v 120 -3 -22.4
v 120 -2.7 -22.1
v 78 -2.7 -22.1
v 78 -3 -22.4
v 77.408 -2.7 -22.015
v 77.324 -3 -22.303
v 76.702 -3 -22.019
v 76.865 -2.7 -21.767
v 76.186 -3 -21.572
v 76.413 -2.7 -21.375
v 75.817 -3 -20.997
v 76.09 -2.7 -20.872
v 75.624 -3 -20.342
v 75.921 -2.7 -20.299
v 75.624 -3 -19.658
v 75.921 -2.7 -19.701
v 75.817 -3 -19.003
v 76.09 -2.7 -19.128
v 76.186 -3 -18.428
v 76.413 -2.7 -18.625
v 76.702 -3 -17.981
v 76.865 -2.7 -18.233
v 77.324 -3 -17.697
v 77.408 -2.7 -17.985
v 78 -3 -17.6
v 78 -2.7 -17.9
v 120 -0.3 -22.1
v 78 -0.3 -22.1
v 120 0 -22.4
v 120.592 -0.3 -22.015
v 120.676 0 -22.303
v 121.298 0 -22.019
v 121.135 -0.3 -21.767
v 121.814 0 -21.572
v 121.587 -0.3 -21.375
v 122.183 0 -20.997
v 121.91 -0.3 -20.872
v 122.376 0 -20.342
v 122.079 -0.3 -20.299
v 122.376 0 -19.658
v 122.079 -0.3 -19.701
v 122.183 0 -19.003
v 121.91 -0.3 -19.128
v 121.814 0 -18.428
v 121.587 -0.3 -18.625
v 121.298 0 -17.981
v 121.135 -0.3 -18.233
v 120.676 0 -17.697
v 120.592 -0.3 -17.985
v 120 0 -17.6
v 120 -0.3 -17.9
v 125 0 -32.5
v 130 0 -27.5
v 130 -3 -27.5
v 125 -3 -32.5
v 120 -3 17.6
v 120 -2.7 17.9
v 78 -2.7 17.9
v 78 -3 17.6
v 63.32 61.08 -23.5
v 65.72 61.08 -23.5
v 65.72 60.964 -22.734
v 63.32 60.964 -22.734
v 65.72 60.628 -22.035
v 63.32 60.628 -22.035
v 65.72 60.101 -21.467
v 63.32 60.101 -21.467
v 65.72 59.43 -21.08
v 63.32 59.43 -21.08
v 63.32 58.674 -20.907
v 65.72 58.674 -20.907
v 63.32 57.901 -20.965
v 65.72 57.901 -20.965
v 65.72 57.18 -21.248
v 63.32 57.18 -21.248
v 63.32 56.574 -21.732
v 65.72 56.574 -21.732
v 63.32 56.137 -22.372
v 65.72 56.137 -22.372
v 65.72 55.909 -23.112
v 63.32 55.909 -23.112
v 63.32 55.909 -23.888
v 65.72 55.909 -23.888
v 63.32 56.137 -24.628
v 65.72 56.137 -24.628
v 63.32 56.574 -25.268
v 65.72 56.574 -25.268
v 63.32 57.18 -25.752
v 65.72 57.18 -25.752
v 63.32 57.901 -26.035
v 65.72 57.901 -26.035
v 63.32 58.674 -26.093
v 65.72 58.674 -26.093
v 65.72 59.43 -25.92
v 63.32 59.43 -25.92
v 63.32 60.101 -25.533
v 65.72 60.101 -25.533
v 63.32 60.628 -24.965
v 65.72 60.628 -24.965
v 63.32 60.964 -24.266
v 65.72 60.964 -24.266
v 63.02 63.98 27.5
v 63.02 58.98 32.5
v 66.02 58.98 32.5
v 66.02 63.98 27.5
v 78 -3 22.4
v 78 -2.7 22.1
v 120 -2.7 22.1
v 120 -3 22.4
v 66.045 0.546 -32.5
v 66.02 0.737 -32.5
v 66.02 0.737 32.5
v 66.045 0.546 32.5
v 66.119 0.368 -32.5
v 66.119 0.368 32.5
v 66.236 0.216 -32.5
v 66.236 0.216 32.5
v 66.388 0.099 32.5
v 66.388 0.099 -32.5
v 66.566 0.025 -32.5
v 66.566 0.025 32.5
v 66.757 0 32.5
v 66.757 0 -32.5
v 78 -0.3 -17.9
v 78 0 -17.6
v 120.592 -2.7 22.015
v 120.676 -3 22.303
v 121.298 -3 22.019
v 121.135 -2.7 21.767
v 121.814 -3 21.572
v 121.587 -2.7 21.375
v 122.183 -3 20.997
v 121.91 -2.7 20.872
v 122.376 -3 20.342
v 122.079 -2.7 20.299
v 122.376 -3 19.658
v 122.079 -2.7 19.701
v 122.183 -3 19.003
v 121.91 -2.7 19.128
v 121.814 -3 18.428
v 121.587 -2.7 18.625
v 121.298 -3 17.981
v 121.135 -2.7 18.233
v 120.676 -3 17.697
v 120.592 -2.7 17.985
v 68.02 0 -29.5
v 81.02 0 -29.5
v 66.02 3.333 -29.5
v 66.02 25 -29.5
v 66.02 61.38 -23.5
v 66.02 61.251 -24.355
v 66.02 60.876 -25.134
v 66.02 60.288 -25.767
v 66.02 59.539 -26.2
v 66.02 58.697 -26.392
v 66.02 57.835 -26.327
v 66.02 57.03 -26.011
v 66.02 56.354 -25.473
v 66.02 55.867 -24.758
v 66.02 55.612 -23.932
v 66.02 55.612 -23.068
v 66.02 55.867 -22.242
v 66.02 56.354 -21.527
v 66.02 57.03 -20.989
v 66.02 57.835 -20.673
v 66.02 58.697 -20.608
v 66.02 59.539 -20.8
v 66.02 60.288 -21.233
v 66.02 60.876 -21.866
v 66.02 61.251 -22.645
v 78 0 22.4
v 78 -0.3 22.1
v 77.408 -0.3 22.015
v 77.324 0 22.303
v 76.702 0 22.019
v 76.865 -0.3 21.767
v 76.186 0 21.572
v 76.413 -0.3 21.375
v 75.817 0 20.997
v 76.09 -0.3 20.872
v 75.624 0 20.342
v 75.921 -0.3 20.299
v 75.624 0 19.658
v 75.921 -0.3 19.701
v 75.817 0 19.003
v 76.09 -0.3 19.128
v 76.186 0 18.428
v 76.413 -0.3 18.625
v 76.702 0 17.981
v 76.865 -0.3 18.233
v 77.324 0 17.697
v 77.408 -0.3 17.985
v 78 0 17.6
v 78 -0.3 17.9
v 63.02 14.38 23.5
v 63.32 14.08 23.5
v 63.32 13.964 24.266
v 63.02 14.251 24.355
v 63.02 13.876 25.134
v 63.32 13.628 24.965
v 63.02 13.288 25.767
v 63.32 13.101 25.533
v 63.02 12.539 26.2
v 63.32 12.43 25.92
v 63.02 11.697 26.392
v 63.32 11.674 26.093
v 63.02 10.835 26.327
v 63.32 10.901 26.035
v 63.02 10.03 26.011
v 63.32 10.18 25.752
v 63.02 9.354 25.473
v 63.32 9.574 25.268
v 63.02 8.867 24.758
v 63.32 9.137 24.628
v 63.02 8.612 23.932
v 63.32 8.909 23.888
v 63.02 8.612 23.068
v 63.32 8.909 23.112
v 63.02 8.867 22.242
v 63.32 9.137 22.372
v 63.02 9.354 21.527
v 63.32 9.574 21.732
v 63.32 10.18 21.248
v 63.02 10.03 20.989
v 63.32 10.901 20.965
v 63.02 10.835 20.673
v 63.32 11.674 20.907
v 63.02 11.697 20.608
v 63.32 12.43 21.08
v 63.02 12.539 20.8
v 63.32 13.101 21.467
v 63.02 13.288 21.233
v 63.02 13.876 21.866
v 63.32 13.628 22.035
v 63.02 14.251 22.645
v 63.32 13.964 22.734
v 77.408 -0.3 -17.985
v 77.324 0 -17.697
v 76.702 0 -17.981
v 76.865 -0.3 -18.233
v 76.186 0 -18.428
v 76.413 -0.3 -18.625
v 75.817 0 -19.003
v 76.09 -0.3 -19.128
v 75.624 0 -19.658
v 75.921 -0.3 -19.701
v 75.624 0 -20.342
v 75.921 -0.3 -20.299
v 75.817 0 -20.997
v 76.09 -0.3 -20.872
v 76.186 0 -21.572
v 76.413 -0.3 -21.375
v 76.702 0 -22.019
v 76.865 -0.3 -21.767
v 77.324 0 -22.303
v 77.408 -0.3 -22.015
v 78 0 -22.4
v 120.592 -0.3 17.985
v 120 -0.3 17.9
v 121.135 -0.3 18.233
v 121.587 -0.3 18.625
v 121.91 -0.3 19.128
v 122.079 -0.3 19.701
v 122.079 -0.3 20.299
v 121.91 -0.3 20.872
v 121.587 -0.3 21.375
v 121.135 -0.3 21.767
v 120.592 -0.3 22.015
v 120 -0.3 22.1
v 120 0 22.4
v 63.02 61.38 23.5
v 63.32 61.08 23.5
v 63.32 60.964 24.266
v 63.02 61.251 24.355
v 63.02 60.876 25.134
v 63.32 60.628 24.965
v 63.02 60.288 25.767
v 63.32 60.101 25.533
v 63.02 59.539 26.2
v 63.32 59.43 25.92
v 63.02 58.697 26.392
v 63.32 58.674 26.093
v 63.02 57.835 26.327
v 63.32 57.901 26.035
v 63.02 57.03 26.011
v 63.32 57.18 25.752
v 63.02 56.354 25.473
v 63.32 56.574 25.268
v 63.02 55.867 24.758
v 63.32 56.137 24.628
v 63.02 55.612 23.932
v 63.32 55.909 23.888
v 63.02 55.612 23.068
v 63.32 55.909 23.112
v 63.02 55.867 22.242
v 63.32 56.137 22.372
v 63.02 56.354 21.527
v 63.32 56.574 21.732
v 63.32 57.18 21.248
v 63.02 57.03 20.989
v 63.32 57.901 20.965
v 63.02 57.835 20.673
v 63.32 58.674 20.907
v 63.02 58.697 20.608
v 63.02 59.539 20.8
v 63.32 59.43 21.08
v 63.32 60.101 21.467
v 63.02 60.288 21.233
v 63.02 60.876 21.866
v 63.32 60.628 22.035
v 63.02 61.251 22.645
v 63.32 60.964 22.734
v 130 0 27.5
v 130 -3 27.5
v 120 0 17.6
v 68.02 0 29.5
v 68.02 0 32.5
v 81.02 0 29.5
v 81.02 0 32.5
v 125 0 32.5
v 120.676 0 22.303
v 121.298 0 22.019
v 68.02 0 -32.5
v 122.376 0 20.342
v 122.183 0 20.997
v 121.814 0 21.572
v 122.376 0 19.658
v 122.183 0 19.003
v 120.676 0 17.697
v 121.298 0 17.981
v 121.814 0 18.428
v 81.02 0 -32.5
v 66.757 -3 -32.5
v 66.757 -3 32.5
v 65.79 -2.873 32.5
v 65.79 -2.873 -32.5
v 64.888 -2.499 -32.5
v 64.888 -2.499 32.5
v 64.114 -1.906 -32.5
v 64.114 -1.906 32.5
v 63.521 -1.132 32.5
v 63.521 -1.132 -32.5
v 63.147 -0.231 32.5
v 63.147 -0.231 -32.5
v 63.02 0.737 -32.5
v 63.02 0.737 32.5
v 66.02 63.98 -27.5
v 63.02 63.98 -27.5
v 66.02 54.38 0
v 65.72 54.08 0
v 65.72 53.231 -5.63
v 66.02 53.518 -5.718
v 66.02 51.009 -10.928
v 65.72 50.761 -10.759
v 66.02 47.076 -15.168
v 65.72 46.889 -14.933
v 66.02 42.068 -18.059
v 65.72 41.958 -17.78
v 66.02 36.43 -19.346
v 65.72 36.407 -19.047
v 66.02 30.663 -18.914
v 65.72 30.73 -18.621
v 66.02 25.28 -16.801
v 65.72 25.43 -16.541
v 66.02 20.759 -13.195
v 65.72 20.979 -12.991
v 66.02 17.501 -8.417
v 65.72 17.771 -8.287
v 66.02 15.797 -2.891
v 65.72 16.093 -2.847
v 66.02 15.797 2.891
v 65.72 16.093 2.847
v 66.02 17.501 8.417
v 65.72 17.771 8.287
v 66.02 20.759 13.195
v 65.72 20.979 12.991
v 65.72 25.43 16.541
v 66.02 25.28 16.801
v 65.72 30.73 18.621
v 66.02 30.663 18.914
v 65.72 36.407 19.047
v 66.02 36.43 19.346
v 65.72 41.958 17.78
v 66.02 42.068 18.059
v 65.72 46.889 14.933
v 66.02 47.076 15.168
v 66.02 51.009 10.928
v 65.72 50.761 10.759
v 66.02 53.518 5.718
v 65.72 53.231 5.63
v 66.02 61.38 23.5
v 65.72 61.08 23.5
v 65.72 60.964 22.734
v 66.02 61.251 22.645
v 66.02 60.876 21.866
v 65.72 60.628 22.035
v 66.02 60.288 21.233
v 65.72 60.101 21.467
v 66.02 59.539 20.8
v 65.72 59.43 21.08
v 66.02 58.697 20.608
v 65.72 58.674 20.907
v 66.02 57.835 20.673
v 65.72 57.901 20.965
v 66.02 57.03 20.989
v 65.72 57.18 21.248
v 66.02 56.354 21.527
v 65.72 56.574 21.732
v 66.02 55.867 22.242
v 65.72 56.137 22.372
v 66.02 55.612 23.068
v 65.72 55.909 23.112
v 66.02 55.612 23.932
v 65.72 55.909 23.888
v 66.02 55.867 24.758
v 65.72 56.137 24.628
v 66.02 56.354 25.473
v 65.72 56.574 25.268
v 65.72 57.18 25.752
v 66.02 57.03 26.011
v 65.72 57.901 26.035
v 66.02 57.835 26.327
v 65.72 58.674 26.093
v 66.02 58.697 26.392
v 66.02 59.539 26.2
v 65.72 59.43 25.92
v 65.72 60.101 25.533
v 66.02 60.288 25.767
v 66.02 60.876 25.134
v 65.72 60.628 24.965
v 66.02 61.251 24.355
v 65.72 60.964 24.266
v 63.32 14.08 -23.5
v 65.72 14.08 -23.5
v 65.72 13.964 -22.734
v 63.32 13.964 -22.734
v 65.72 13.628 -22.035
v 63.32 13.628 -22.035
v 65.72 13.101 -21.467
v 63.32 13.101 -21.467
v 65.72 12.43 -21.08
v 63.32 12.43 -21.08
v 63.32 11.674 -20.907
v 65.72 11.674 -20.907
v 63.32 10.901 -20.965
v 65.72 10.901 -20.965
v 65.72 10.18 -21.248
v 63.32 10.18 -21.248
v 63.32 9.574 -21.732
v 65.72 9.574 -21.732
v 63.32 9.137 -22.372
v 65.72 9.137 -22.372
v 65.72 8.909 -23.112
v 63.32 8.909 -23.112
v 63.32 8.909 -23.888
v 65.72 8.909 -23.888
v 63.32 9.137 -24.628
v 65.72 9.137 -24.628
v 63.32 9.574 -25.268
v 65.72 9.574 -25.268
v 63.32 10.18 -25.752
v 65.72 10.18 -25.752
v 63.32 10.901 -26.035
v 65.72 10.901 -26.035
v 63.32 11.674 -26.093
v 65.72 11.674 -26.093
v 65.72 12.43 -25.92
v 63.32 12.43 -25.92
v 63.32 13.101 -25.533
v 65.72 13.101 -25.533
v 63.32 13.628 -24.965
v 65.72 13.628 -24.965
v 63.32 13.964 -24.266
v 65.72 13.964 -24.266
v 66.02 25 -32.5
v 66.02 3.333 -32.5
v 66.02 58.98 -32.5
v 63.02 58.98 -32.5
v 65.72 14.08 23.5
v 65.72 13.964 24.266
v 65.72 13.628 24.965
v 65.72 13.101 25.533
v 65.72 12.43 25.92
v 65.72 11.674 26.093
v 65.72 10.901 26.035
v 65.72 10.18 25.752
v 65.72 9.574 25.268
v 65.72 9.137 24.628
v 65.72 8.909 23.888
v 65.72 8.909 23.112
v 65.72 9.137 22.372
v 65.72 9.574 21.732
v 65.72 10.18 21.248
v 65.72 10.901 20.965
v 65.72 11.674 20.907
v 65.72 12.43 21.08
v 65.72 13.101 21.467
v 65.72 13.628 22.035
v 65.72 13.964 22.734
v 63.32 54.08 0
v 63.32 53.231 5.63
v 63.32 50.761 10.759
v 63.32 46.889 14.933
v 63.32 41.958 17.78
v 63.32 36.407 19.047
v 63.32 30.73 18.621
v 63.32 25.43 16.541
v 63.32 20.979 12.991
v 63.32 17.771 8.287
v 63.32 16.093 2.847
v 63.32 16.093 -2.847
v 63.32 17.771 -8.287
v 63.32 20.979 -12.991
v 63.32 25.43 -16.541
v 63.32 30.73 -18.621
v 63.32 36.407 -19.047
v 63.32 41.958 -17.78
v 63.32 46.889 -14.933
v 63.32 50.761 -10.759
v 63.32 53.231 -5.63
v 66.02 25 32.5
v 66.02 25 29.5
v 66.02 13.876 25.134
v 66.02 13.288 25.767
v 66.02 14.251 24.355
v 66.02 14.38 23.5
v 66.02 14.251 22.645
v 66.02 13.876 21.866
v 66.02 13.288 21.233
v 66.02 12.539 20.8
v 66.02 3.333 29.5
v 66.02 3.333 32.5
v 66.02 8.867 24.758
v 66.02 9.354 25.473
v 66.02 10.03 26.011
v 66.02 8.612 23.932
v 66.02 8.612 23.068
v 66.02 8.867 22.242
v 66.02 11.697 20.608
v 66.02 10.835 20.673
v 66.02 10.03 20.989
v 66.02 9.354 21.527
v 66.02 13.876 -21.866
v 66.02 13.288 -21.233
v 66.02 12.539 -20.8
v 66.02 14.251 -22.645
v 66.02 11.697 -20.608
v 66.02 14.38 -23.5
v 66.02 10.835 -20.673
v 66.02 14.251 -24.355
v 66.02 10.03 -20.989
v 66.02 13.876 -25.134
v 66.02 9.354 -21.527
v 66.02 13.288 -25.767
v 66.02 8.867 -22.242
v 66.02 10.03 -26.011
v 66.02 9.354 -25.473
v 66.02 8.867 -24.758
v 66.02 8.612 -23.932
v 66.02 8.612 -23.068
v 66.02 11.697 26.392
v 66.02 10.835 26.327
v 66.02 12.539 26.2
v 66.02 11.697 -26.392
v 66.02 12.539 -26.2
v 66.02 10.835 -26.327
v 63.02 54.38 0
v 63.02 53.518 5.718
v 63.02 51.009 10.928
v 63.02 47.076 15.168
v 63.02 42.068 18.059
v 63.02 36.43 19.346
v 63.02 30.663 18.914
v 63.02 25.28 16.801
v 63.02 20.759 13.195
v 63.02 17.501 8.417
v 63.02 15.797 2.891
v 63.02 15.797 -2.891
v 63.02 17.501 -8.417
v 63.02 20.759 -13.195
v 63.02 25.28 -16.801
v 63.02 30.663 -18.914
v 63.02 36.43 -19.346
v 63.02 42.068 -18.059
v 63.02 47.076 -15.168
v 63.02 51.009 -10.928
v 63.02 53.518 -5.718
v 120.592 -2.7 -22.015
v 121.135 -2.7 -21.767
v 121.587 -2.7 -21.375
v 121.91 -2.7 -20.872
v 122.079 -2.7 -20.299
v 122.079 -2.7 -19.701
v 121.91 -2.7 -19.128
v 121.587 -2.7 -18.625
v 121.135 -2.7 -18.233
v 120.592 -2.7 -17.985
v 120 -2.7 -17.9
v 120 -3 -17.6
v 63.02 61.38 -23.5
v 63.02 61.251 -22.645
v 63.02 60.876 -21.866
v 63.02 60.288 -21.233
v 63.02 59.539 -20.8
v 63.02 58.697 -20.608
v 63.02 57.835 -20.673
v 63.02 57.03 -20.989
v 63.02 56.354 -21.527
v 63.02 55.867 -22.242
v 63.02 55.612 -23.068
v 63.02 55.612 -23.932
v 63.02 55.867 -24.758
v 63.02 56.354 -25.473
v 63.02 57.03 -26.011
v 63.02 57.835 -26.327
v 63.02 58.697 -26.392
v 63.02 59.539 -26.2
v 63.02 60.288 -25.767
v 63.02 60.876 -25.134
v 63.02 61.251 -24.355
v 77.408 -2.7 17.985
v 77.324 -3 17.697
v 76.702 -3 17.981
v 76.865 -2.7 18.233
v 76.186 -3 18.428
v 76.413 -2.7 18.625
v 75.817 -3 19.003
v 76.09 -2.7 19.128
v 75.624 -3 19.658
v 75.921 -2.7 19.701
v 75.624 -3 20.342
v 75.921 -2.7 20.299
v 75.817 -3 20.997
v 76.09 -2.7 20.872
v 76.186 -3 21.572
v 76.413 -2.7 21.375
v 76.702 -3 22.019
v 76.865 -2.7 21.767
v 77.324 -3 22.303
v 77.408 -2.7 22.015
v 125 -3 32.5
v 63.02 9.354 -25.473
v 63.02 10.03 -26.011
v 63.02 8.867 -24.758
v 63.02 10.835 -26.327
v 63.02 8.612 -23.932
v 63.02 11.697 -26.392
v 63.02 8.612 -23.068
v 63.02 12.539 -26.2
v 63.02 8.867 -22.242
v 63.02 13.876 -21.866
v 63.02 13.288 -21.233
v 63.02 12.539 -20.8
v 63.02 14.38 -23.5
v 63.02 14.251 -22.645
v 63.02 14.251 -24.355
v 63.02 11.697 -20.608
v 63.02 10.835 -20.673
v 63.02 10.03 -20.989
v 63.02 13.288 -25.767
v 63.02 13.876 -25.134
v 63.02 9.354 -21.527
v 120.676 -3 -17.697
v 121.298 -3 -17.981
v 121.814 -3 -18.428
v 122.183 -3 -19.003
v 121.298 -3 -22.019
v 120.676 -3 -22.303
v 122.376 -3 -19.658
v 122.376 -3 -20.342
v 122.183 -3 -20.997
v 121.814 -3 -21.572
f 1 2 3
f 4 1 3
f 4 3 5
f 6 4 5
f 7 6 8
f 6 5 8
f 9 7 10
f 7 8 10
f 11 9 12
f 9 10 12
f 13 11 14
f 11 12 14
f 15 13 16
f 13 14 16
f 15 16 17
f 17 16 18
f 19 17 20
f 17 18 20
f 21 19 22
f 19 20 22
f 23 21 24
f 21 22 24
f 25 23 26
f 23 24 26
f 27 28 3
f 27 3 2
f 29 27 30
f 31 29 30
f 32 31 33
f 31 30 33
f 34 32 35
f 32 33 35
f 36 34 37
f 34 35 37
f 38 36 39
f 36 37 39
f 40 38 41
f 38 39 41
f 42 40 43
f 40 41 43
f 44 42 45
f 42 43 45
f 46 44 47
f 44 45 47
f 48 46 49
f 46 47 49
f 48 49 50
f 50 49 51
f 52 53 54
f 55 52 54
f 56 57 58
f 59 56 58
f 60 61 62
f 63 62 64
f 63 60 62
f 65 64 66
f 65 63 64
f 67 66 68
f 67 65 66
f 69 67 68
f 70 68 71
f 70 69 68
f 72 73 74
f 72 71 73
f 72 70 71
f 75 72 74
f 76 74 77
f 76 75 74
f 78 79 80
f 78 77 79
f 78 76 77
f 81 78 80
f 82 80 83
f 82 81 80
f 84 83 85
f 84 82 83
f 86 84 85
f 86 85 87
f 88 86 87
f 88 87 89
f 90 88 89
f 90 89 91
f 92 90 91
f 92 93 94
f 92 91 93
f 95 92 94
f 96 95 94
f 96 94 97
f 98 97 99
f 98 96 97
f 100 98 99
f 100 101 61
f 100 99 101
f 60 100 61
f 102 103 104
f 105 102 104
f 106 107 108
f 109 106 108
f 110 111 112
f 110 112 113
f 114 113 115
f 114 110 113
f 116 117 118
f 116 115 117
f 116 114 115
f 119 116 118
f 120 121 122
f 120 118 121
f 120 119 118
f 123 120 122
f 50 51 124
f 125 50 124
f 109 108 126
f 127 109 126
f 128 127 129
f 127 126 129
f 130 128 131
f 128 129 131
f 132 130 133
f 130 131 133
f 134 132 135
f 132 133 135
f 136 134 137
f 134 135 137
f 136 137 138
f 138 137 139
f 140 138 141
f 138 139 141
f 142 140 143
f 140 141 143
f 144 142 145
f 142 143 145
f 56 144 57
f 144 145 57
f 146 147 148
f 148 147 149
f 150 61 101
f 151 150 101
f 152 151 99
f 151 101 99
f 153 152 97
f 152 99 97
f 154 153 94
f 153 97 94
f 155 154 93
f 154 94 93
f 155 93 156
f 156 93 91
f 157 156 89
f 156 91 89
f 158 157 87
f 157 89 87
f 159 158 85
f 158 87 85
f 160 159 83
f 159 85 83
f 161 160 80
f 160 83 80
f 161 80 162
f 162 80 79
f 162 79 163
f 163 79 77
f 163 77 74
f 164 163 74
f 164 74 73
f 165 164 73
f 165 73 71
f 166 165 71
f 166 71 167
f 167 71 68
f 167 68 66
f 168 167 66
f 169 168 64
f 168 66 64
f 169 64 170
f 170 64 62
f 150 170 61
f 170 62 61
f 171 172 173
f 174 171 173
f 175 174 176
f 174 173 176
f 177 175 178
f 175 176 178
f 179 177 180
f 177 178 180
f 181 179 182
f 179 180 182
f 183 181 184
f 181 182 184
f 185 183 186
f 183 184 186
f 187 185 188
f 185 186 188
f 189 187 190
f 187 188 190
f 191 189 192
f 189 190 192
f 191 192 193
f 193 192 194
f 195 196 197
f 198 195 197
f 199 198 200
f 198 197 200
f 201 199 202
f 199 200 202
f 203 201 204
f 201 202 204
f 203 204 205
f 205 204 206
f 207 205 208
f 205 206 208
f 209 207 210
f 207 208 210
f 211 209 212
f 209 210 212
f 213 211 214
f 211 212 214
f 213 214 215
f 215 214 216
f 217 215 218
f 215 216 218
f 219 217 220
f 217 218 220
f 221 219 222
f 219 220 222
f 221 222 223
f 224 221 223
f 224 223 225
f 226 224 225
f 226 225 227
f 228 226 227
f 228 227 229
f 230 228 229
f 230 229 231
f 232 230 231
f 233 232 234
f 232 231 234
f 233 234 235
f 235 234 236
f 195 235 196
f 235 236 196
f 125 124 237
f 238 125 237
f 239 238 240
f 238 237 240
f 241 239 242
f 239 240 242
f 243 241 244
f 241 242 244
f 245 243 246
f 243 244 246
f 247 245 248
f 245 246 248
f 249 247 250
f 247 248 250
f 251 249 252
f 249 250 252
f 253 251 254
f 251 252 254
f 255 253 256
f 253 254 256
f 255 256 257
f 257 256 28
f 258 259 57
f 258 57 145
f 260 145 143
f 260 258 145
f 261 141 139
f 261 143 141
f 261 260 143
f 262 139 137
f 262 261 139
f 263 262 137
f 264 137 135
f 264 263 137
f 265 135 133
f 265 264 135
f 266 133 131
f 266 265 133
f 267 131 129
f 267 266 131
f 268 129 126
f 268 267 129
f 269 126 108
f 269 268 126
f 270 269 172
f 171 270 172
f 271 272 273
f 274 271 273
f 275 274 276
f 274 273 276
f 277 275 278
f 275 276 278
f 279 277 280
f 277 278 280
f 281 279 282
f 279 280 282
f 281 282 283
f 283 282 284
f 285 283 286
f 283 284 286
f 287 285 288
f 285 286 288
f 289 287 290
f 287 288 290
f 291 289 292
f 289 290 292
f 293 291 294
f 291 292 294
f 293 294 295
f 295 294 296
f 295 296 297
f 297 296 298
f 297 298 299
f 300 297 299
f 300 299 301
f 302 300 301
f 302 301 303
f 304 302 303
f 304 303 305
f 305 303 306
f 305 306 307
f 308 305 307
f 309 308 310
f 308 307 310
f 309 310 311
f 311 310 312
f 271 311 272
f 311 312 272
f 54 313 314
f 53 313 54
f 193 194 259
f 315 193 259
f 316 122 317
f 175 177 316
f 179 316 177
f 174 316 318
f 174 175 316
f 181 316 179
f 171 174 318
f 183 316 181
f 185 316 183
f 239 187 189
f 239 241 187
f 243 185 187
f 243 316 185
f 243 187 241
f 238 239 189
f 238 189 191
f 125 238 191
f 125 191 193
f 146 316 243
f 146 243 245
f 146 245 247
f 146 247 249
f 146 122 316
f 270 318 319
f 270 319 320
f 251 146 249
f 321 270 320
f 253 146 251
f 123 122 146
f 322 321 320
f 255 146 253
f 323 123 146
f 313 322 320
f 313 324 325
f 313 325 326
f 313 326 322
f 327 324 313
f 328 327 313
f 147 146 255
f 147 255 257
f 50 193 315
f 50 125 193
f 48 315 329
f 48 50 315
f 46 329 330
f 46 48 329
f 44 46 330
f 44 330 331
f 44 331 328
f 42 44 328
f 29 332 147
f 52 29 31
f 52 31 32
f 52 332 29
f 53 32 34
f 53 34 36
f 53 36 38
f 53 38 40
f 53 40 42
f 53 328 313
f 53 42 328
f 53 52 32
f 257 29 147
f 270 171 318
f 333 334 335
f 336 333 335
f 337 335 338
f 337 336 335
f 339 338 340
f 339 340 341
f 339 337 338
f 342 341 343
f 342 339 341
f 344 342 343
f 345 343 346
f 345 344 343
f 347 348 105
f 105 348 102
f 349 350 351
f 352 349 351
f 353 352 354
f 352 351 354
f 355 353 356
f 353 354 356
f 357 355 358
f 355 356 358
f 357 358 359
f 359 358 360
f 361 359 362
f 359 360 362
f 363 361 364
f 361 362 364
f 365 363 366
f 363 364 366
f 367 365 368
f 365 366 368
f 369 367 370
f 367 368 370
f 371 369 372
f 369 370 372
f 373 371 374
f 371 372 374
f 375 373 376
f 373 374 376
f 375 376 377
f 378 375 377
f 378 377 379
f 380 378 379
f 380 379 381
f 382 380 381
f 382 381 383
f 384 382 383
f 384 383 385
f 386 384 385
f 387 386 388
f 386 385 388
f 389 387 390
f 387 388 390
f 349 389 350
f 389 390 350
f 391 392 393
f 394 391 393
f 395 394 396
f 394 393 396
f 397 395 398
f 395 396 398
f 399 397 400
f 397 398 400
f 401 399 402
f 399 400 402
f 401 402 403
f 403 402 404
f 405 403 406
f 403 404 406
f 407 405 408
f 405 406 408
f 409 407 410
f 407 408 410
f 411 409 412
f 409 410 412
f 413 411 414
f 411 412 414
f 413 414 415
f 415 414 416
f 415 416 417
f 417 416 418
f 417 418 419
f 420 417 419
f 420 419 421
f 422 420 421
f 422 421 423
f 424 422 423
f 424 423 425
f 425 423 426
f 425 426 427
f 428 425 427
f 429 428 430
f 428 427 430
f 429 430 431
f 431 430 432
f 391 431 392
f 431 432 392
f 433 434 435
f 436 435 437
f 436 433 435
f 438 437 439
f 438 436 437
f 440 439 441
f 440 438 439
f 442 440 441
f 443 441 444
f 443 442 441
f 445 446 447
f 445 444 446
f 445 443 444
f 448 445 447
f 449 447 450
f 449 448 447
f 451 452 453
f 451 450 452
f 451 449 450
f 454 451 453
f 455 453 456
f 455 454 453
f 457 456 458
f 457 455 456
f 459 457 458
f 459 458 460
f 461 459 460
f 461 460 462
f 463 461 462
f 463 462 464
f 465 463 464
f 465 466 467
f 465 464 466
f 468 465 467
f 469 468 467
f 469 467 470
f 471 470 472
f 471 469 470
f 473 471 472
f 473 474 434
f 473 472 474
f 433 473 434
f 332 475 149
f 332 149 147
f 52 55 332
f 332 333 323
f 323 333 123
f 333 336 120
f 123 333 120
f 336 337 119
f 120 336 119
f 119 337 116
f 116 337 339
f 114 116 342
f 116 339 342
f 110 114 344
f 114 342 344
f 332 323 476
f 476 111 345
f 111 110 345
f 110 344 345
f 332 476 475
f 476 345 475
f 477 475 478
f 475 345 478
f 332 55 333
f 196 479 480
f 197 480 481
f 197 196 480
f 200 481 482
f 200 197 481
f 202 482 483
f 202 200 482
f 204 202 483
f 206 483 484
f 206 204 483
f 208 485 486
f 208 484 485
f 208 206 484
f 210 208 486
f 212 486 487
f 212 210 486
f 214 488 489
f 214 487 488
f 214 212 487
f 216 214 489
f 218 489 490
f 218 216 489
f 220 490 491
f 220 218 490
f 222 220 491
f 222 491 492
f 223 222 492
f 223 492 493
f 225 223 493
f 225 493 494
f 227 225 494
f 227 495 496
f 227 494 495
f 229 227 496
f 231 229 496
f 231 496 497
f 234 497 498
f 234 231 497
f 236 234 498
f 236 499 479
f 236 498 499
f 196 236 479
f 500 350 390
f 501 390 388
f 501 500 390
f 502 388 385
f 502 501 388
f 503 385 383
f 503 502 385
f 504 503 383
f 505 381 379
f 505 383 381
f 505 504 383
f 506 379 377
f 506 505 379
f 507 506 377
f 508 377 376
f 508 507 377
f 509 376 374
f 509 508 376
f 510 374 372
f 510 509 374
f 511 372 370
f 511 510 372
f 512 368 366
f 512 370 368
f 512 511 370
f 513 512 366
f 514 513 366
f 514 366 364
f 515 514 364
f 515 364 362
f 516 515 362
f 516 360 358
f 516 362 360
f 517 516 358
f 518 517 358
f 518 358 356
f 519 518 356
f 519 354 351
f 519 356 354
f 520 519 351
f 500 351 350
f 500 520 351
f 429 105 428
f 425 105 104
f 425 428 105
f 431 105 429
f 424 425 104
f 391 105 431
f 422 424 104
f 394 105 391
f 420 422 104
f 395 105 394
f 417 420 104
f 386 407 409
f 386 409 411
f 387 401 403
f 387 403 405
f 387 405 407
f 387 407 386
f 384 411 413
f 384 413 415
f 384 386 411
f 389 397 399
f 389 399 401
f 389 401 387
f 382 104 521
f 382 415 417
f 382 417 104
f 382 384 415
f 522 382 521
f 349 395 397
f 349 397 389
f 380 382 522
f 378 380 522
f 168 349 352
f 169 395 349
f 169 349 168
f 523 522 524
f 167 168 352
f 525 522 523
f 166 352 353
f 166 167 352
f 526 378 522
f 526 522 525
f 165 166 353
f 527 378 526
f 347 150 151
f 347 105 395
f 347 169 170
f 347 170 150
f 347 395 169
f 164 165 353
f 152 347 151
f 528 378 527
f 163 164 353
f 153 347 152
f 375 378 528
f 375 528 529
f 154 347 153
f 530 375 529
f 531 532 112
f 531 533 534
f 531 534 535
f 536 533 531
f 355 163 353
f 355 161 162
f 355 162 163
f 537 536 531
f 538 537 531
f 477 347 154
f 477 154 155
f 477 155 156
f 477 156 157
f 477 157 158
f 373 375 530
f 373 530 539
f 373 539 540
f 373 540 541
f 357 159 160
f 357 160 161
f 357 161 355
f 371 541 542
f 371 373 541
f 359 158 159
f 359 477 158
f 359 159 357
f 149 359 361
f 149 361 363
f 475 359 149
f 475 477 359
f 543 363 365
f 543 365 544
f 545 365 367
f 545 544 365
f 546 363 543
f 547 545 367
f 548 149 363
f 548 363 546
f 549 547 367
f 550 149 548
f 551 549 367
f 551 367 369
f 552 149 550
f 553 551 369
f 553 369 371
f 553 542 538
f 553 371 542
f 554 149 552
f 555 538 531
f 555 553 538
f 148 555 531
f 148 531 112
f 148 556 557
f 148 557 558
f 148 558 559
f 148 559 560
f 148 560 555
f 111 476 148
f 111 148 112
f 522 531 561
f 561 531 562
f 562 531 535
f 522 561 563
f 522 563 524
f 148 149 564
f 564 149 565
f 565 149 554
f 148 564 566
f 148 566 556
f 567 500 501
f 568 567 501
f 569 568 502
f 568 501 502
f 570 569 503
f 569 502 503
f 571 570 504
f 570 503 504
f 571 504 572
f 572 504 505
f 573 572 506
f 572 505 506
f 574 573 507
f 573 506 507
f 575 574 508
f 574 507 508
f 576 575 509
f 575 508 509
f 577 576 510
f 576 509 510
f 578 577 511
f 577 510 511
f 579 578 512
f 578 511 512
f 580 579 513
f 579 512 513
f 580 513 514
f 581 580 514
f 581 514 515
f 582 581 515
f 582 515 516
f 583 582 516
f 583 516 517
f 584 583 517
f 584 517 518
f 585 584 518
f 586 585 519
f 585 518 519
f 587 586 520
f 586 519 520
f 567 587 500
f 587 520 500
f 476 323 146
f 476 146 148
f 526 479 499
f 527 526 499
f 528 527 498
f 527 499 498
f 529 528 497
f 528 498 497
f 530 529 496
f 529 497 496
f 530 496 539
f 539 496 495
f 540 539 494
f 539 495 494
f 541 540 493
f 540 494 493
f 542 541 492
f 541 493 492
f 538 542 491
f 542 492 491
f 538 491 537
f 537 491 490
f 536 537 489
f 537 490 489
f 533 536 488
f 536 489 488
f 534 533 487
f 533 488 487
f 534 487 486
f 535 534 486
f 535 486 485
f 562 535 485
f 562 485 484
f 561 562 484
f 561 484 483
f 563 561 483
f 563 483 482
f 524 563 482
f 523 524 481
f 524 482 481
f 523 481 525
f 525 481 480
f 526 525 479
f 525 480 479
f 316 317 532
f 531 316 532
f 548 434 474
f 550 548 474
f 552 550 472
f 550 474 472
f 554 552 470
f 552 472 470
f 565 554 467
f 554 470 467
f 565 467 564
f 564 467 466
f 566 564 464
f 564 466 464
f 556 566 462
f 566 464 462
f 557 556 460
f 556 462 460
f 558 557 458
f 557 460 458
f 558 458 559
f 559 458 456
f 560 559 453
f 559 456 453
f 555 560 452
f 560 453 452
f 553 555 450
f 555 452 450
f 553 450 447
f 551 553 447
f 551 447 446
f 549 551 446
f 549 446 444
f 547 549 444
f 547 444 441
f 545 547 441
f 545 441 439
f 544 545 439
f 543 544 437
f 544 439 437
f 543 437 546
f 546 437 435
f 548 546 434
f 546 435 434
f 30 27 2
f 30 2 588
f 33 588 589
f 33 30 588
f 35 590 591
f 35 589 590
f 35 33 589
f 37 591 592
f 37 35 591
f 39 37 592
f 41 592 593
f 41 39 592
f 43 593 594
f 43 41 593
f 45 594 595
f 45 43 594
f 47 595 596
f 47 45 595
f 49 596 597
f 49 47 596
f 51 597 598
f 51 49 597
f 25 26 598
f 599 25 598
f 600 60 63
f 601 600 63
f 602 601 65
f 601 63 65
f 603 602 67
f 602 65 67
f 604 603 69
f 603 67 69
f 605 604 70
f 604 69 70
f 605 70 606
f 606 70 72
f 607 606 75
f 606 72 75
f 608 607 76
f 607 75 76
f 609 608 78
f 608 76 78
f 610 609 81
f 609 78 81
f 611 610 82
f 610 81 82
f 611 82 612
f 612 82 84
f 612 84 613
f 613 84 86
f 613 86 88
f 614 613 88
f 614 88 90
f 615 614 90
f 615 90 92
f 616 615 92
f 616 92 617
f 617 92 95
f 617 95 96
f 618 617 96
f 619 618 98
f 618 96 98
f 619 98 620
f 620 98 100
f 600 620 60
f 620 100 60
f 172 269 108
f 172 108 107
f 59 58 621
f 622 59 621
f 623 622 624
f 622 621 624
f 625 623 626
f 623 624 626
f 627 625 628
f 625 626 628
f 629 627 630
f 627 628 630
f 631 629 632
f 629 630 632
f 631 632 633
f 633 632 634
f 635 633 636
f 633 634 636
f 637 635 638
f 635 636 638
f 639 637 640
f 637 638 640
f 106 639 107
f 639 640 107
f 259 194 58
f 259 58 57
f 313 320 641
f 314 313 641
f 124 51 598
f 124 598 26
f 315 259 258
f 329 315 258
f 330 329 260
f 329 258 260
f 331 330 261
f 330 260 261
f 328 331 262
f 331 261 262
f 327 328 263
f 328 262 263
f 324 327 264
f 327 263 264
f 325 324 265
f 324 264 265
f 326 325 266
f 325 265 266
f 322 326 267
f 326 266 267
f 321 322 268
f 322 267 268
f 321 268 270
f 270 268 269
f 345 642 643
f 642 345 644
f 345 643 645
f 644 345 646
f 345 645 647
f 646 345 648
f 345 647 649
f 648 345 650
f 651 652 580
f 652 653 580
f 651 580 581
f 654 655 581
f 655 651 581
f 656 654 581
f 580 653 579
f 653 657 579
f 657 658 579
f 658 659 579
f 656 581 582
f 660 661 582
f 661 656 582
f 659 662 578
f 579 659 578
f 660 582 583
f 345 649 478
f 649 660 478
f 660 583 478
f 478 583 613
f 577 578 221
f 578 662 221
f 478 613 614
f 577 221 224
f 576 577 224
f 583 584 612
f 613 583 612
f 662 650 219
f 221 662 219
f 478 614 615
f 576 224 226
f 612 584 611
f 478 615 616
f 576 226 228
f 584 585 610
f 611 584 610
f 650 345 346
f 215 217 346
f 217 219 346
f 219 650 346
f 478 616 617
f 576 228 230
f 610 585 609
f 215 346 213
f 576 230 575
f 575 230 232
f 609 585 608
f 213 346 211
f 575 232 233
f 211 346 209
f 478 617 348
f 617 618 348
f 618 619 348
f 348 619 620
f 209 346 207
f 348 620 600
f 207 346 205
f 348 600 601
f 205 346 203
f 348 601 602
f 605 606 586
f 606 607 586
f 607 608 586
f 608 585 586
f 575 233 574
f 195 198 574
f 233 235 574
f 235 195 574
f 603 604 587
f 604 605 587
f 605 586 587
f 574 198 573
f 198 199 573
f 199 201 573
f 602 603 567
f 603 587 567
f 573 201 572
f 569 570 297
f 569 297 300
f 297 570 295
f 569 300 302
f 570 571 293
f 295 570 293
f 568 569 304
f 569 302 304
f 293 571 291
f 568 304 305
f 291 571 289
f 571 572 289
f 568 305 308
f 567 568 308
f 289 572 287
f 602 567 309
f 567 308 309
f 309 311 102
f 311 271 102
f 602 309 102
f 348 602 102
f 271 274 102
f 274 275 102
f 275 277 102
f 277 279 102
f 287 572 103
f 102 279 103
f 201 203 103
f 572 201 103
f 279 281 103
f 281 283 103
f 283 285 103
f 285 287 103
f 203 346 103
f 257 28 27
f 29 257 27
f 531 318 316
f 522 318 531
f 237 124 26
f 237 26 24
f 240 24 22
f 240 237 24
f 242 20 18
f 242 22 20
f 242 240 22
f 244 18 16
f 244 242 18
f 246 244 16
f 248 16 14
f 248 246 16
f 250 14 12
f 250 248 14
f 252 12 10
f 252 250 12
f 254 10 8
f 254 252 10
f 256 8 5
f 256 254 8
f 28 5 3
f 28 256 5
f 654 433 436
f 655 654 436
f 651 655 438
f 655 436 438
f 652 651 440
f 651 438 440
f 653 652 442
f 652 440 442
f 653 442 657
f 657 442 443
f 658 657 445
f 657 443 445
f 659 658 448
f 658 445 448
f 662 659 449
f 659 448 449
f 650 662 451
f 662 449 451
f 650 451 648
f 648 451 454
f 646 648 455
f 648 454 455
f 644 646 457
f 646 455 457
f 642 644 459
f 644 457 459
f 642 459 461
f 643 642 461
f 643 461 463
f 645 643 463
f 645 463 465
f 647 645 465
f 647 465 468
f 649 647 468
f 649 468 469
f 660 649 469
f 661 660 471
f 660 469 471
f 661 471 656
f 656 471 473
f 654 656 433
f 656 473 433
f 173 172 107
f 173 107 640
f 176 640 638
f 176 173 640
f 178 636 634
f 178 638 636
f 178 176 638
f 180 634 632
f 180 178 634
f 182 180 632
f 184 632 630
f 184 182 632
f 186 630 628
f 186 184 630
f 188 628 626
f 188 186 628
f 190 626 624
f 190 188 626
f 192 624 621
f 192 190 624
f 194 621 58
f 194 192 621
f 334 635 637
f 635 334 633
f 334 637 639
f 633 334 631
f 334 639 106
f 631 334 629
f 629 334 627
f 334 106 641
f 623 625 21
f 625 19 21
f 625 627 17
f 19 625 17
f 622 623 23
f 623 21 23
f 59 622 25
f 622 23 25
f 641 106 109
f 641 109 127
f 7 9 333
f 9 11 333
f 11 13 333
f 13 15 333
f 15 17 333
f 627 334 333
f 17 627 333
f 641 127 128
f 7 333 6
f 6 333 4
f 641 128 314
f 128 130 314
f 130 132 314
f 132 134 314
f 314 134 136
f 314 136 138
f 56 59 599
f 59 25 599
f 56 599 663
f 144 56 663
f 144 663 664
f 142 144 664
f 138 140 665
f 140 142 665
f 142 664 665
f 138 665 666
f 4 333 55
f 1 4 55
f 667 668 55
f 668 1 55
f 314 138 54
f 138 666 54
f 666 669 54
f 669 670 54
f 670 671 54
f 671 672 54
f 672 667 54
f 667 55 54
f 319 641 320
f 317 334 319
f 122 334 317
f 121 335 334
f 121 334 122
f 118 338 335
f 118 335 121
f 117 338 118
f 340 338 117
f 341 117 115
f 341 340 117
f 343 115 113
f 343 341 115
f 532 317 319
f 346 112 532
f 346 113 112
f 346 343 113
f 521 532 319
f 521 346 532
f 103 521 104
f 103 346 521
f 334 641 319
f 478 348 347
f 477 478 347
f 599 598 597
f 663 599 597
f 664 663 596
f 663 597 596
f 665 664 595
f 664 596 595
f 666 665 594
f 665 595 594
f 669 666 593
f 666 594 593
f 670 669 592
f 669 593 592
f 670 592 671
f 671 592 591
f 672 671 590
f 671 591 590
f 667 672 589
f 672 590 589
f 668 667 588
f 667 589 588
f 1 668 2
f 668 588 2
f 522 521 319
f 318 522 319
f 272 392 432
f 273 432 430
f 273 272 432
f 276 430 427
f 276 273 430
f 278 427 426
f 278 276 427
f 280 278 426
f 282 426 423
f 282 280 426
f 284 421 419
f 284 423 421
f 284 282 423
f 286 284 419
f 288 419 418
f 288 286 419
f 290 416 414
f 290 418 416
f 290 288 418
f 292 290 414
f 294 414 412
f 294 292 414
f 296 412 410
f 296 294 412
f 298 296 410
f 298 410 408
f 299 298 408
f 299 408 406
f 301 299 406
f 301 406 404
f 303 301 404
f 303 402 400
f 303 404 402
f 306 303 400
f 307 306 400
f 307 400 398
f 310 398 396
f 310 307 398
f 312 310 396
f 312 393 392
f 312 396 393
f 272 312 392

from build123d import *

# Parameters (mm, degrees)
SKETCH1_W                    = 130
SKETCH1_H                    = 65
BASE_FLANGE1_DEPTH           = 3
SKETCH2_R                    = 19.1
SKETCH2_R_2                  = 2.6
CUT_EXTRUDE1_DEPTH           = 135.034510481
CUT_EXTRUDE3_DEPTH           = 135.034510481
SKETCHED_BEND2_OUTLINE_W     = 3
SKETCHED_BEND2_OUTLINE_H     = 65
SKETCHED_BEND2_DEPTH         = 63.020021532
SKETCHED_START               = 63.383443248
SKETCHED_BEND2_2_OUTLINE_W   = 63.979978468
SKETCHED_BEND2_2_OUTLINE_H   = 65
SKETCHED_BEND2_2_OUTLINE_R   = 2.6
SKETCHED_BEND2_2_OUTLINE_R_2 = 19.1
SKETCHED_BEND2_2_DEPTH       = 2.636578284
SKETCHED_START_2             = 63.020021532
SKETCHED_BEND2_3_OUTLINE_W   = 63.979978468
SKETCHED_BEND2_3_OUTLINE_H   = 65
SKETCHED_BEND2_3_OUTLINE_R   = 2.6
SKETCHED_BEND2_3_OUTLINE_R_2 = 19.1
SKETCHED_BEND2_3_DEPTH       = 3.7366
SKETCHED_START_3             = -33
SKETCHED_BEND2_4_DEPTH       = 66
BOSS_EXTRUDE1_DEPTH          = 3
CHAMFER1_SIZE                = 5
CHAMFER2_SIZE                = 0.3


with BuildPart() as part:
    # Base-Flange1: sheet metal written as solids
    # Sketch1 → Base-Flange1 (new body)
    with BuildSketch(Plane(origin=(0, 0, 0), x_dir=(1, 0, 0), z_dir=(0, 1, 0))):
        with Locations((65, 0)):
            Rectangle(SKETCH1_W, SKETCH1_H)
    extrude(amount=-BASE_FLANGE1_DEPTH)

    # Sketch2 → Cut-Extrude1 (cut, through all)
    with BuildSketch(Plane(origin=(0, 0, 0), x_dir=(1, 0, 0), z_dir=(0, 1, 0))):
        with Locations(Location((29, 0, 0), (0, 0, 270))):
            Circle(SKETCH2_R)
        with Locations(Location((5.5, 23.5, 0), (0, 0, 270))):
            Circle(SKETCH2_R_2)
        with Locations(Location((52.5, 23.5, 0), (0, 0, 270))):
            Circle(SKETCH2_R_2)
        with Locations(Location((52.5, -23.5, 0), (0, 0, 270))):
            Circle(SKETCH2_R_2)
        with Locations(Location((5.5, -23.5, 0), (0, 0, 270))):
            Circle(SKETCH2_R_2)
    extrude(amount=-CUT_EXTRUDE1_DEPTH, mode=Mode.SUBTRACT)

    # Sketch4 → Cut-Extrude3 (cut, through all)
    with BuildSketch(Plane(origin=(0, 0, 0), x_dir=(1, 0, 0), z_dir=(0, 1, 0))):
        with BuildLine():
            Line((78, 22.1), (120, 22.1))
            ThreePointArc((120, 22.1), (122.1, 20), (120, 17.9))
            Line((120, 17.9), (78, 17.9))
            ThreePointArc((78, 17.9), (75.9, 20), (78, 22.1))
        make_face()
        with BuildLine():
            Line((78, -17.9), (120, -17.9))
            ThreePointArc((120, -17.9), (122.1, -20), (120, -22.1))
            Line((120, -22.1), (78, -22.1))
            ThreePointArc((78, -22.1), (75.9, -20), (78, -17.9))
        make_face()
    extrude(amount=-CUT_EXTRUDE3_DEPTH, mode=Mode.SUBTRACT)

    # Sketched Bend2: read off the stored shape, not the designer's step
    # Sketched Bend2 outline → Sketched Bend2 (cut)
    with BuildSketch(Plane.YZ):
        with Locations((-1.5, 0)):
            Rectangle(SKETCHED_BEND2_OUTLINE_W, SKETCHED_BEND2_OUTLINE_H)
    extrude(amount=SKETCHED_BEND2_DEPTH, mode=Mode.SUBTRACT)

    # Sketched Bend2 2 outline → Sketched Bend2 2 (add)
    with BuildSketch(Plane.YZ.offset(SKETCHED_START)):
        with Locations((31.989989234, 0)):
            Rectangle(SKETCHED_BEND2_2_OUTLINE_W, SKETCHED_BEND2_2_OUTLINE_H)
        with Locations((11.479978468, -23.5)):
            Circle(SKETCHED_BEND2_2_OUTLINE_R, mode=Mode.SUBTRACT)
        with Locations((58.479978468, -23.5)):
            Circle(SKETCHED_BEND2_2_OUTLINE_R, mode=Mode.SUBTRACT)
        with Locations((11.479978468, 23.5)):
            Circle(SKETCHED_BEND2_2_OUTLINE_R, mode=Mode.SUBTRACT)
        with Locations((34.979978468, 0)):
            Circle(SKETCHED_BEND2_2_OUTLINE_R_2, mode=Mode.SUBTRACT)
        with Locations((58.479978468, 23.5)):
            Circle(SKETCHED_BEND2_2_OUTLINE_R, mode=Mode.SUBTRACT)
    extrude(amount=SKETCHED_BEND2_2_DEPTH)

    # Sketched Bend2 3 outline → Sketched Bend2 3 (add)
    with BuildSketch(Plane.YZ.offset(SKETCHED_START_2)):
        with Locations((31.989989234, 0)):
            Rectangle(SKETCHED_BEND2_3_OUTLINE_W, SKETCHED_BEND2_3_OUTLINE_H)
        with Locations((11.479978468, -23.5)):
            Circle(SKETCHED_BEND2_3_OUTLINE_R, mode=Mode.SUBTRACT)
        with Locations((58.479978468, -23.5)):
            Circle(SKETCHED_BEND2_3_OUTLINE_R, mode=Mode.SUBTRACT)
        with Locations((11.479978468, 23.5)):
            Circle(SKETCHED_BEND2_3_OUTLINE_R, mode=Mode.SUBTRACT)
        with Locations((34.979978468, 0)):
            Circle(SKETCHED_BEND2_3_OUTLINE_R_2, mode=Mode.SUBTRACT)
        with Locations((58.479978468, 23.5)):
            Circle(SKETCHED_BEND2_3_OUTLINE_R, mode=Mode.SUBTRACT)
    extrude(amount=SKETCHED_BEND2_3_DEPTH)

    # Sketched Bend2 4 outline → Sketched Bend2 4 (cut)
    with BuildSketch(Plane.XY.offset(SKETCHED_START_3)):
        with BuildLine():
            Line((66.756621532, 63.979978468), (66.020021532, 63.979978468))
            Line((66.020021532, 63.979978468), (66.020021532, 0.7366))
            ThreePointArc((66.020021532, 0.7366), (66.235766677, 0.215745145), (66.756621532, 0))
            Line((66.756621532, 0), (66.756621532, 63.979978468))
        make_face()
        with BuildLine():
            ThreePointArc((66.756621532, -3), (64.114446333, -1.905575199), (63.020021532, 0.7366))
            Line((63.020021532, 0.7366), (63.020021532, -3))
            Line((63.020021532, -3), (66.756621532, -3))
        make_face()
    extrude(amount=SKETCHED_BEND2_4_DEPTH, mode=Mode.SUBTRACT)

    # Sketch6 → Boss-Extrude1 (add)
    with BuildSketch(Plane.XY.offset(32.5)):
        Polygon((66.020021532, 25), (81.020021532, 0), (68.020021532, 0), (66.020021532, 3.333333333), align=None)
    boss_extrude1 = extrude(amount=-BOSS_EXTRUDE1_DEPTH)

    # Mirror1: Boss-Extrude1 across plane
    add(boss_extrude1.mirror(Plane.XY))

    # Chamfer1
    chamfer1_edges = [part.edges().sort_by_distance(p)[0] for p in [
        (64.520021532, 63.979978468, -32.5),
        (64.520021532, 63.979978468, 32.5),
        (130, -1.5, -32.5),
        (130, -1.5, 32.5),
    ]]
    chamfer(chamfer1_edges, length=CHAMFER1_SIZE)

    # Chamfer2
    chamfer2_edges = [part.edges().sort_by_distance(p)[0] for p in [
        (63.020021532, 15.879978468, 0),
        (66.020021532, 15.879978468, 0),
        (63.020021532, 55.879978468, -23.5),
        (66.020021532, 55.879978468, -23.5),
        (63.020021532, 8.879978468, -23.5),
        (66.020021532, 8.879978468, -23.5),
        (63.020021532, 8.879978468, 23.5),
        (66.020021532, 8.879978468, 23.5),
        (63.020021532, 55.879978468, 23.5),
        (66.020021532, 55.879978468, 23.5),
        (99, 0, -22.1),
        (122.1, 0, -20),
        (99, 0, -17.9),
        (75.9, 0, -20),
        (99, 0, 17.9),
        (122.1, 0, 20),
        (99, 0, 22.1),
        (75.9, 0, 20),
        (75.9, -3, 20),
        (99, -3, 22.1),
        (122.1, -3, 20),
        (99, -3, 17.9),
        (75.9, -3, -20),
        (99, -3, -17.9),
        (122.1, -3, -20),
        (99, -3, -22.1),
    ]]
    chamfer(chamfer2_edges, length=CHAMFER2_SIZE)


solid = part.part
